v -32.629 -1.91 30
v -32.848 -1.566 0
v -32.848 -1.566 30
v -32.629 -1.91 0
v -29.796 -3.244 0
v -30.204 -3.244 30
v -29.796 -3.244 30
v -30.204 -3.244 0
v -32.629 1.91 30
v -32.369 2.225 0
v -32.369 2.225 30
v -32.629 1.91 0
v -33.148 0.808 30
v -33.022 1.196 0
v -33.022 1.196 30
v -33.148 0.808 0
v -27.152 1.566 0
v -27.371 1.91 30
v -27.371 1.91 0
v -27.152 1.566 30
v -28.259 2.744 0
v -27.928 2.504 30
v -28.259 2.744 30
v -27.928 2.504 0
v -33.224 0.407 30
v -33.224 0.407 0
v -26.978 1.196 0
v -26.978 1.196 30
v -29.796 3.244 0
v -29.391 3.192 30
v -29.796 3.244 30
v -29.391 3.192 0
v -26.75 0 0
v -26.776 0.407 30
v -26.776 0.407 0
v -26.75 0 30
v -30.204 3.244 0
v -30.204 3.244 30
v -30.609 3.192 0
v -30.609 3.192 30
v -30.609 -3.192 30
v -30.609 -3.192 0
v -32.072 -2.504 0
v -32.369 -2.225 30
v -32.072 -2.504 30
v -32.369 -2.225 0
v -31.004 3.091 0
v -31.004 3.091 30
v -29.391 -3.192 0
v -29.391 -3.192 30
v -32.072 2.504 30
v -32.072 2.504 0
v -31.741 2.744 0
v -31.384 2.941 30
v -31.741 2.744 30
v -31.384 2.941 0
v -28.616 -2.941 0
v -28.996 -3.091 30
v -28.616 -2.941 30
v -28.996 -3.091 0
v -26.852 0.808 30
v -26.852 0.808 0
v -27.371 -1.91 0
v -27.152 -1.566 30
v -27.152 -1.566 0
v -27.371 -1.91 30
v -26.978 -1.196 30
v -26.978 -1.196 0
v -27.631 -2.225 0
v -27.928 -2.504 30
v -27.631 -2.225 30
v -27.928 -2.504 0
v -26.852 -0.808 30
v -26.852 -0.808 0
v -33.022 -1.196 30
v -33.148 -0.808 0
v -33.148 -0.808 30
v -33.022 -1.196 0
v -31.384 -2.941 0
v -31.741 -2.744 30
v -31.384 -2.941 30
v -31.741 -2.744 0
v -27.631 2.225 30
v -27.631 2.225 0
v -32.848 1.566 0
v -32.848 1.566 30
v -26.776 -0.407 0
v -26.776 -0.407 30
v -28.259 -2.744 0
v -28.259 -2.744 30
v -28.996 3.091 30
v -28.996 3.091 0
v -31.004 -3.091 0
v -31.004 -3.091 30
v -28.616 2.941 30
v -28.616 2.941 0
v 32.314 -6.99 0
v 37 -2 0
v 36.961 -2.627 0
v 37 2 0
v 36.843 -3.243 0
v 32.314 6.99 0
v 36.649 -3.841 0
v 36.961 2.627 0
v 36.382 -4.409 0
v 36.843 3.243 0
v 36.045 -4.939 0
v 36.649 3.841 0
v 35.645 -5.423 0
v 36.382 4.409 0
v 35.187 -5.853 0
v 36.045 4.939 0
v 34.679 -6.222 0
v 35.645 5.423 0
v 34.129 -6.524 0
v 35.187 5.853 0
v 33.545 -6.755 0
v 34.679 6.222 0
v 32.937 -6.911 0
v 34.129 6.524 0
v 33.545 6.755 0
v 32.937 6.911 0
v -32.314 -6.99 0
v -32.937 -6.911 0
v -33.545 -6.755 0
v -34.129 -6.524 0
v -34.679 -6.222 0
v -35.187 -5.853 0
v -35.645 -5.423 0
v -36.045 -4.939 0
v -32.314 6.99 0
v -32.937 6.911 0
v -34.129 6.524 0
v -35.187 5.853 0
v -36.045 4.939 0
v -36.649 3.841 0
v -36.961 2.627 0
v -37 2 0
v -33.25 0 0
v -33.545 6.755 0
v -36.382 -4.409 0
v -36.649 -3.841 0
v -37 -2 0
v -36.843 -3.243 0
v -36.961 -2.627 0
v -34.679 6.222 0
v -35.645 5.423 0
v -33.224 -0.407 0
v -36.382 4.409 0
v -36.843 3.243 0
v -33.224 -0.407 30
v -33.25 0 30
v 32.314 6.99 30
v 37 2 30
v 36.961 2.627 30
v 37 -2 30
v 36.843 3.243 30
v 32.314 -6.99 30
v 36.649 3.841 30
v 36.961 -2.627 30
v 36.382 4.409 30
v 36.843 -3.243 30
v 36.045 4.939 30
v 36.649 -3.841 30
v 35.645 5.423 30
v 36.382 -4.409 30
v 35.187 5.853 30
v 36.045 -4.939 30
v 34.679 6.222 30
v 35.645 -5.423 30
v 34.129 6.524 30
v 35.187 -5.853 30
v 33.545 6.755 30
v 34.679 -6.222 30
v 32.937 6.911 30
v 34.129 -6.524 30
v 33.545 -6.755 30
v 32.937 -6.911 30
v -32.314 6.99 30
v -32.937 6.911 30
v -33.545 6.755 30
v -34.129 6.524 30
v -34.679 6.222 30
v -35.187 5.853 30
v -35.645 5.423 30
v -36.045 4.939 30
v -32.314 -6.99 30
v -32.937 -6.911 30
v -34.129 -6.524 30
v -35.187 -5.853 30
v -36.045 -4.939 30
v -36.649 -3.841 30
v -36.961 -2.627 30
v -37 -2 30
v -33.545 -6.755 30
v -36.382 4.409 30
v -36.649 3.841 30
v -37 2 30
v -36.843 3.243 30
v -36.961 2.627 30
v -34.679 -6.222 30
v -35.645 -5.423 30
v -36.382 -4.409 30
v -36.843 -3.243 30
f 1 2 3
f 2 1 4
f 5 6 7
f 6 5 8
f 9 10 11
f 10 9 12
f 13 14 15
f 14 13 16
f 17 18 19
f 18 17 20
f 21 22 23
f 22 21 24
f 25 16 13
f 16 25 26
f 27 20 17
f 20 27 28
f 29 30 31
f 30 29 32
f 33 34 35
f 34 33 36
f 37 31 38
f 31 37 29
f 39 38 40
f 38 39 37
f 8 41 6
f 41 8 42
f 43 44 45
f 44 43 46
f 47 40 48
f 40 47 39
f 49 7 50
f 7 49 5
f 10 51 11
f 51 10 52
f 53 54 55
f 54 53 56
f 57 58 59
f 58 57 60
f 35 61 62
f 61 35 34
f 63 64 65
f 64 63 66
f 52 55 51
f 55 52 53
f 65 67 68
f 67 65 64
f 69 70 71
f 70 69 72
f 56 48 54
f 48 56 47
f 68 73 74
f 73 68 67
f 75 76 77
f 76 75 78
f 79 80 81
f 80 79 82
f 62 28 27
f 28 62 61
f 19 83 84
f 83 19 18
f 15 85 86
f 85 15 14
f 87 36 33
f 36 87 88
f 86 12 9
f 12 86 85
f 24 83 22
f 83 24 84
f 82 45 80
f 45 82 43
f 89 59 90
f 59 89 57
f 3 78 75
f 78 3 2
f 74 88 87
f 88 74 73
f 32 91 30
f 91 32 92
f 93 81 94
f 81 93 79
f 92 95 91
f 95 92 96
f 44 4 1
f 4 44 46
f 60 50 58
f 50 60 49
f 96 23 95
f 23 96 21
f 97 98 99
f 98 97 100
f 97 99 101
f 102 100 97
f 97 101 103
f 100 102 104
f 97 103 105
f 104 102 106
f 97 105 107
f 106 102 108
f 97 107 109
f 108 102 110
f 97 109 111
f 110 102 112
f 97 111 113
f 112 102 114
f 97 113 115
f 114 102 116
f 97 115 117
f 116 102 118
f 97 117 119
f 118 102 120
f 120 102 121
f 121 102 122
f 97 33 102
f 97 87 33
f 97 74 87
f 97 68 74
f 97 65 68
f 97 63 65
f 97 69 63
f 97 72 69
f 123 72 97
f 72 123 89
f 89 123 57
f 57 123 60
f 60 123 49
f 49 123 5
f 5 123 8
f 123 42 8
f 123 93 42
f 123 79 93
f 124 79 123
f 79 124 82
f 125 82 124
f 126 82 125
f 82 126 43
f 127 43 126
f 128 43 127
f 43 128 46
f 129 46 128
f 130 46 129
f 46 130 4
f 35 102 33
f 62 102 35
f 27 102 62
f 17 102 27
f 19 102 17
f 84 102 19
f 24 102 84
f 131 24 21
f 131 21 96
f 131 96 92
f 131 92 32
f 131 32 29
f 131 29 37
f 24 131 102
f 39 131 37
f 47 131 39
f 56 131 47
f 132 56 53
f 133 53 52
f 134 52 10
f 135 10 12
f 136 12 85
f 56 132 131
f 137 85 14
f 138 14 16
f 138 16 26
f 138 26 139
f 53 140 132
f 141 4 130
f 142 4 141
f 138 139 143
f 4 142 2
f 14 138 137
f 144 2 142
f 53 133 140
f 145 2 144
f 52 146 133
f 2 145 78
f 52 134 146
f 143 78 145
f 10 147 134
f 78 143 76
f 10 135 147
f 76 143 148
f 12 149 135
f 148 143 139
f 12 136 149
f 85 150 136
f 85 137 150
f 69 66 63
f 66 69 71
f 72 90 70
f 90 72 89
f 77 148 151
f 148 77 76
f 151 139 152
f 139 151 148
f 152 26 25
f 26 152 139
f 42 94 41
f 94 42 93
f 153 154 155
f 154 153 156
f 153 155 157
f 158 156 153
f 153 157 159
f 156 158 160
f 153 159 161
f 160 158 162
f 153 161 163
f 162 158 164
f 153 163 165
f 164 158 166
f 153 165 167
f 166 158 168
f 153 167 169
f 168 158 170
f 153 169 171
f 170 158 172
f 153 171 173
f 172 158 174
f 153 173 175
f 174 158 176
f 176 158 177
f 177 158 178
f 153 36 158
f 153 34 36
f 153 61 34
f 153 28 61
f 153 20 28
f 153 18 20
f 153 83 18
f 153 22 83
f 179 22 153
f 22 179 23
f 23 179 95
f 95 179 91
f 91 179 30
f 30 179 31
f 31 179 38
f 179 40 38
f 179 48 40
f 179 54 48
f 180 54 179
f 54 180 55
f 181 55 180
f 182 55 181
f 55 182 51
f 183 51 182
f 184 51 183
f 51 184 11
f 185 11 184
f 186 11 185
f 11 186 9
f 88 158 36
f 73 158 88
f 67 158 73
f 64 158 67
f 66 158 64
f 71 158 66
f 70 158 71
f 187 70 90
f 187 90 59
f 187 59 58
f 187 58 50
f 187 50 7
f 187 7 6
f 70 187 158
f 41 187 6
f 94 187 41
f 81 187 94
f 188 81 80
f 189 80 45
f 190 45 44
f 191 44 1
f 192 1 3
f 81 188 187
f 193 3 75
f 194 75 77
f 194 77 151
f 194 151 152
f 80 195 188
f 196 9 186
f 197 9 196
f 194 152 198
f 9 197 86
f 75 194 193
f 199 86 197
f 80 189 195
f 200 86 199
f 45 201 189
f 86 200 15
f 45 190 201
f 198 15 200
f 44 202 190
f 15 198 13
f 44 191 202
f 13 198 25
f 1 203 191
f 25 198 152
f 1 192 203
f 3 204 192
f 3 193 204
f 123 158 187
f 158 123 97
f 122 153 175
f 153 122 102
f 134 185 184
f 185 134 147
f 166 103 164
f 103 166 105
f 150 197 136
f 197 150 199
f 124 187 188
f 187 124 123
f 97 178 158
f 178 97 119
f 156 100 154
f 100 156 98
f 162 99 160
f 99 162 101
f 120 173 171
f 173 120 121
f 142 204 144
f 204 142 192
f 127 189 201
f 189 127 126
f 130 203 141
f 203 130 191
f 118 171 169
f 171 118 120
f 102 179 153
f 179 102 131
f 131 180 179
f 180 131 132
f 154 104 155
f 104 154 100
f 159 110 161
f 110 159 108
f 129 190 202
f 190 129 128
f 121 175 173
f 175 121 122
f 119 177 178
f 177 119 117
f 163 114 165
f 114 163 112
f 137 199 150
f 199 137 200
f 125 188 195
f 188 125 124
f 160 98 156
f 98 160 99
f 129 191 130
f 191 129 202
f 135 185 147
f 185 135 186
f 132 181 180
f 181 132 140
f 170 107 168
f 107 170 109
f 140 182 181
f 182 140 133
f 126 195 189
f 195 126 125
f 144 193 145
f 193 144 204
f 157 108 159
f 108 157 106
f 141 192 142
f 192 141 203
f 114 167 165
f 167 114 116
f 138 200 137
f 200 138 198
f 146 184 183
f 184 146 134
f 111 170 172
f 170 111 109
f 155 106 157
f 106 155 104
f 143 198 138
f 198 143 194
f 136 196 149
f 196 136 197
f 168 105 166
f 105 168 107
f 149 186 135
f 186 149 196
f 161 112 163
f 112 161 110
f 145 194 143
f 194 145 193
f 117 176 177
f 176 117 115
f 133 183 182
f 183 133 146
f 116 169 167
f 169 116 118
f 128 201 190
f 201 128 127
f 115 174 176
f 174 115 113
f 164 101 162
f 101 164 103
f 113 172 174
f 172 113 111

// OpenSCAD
$fn = 50;


difference() {
	union() {
		hull() {
			translate(v = [-32.0000000000, 2.0000000000, 0]) {
				cylinder(h = 30, r = 5);
			}
			translate(v = [32.0000000000, 2.0000000000, 0]) {
				cylinder(h = 30, r = 5);
			}
			translate(v = [-32.0000000000, -2.0000000000, 0]) {
				cylinder(h = 30, r = 5);
			}
			translate(v = [32.0000000000, -2.0000000000, 0]) {
				cylinder(h = 30, r = 5);
			}
		}
	}
	union() {
		translate(v = [-30.0000000000, 0.0000000000, 0]) {
			cylinder(h = 30, r = 3.2500000000);
		}
		translate(v = [-30.0000000000, 0.0000000000, 0]) {
			cylinder(h = 30, r = 1.8000000000);
		}
		translate(v = [-30.0000000000, 0.0000000000, 0]) {
			cylinder(h = 30, r = 1.8000000000);
		}
		translate(v = [-30.0000000000, 0.0000000000, 0]) {
			cylinder(h = 30, r = 1.8000000000);
		}
	}
}
